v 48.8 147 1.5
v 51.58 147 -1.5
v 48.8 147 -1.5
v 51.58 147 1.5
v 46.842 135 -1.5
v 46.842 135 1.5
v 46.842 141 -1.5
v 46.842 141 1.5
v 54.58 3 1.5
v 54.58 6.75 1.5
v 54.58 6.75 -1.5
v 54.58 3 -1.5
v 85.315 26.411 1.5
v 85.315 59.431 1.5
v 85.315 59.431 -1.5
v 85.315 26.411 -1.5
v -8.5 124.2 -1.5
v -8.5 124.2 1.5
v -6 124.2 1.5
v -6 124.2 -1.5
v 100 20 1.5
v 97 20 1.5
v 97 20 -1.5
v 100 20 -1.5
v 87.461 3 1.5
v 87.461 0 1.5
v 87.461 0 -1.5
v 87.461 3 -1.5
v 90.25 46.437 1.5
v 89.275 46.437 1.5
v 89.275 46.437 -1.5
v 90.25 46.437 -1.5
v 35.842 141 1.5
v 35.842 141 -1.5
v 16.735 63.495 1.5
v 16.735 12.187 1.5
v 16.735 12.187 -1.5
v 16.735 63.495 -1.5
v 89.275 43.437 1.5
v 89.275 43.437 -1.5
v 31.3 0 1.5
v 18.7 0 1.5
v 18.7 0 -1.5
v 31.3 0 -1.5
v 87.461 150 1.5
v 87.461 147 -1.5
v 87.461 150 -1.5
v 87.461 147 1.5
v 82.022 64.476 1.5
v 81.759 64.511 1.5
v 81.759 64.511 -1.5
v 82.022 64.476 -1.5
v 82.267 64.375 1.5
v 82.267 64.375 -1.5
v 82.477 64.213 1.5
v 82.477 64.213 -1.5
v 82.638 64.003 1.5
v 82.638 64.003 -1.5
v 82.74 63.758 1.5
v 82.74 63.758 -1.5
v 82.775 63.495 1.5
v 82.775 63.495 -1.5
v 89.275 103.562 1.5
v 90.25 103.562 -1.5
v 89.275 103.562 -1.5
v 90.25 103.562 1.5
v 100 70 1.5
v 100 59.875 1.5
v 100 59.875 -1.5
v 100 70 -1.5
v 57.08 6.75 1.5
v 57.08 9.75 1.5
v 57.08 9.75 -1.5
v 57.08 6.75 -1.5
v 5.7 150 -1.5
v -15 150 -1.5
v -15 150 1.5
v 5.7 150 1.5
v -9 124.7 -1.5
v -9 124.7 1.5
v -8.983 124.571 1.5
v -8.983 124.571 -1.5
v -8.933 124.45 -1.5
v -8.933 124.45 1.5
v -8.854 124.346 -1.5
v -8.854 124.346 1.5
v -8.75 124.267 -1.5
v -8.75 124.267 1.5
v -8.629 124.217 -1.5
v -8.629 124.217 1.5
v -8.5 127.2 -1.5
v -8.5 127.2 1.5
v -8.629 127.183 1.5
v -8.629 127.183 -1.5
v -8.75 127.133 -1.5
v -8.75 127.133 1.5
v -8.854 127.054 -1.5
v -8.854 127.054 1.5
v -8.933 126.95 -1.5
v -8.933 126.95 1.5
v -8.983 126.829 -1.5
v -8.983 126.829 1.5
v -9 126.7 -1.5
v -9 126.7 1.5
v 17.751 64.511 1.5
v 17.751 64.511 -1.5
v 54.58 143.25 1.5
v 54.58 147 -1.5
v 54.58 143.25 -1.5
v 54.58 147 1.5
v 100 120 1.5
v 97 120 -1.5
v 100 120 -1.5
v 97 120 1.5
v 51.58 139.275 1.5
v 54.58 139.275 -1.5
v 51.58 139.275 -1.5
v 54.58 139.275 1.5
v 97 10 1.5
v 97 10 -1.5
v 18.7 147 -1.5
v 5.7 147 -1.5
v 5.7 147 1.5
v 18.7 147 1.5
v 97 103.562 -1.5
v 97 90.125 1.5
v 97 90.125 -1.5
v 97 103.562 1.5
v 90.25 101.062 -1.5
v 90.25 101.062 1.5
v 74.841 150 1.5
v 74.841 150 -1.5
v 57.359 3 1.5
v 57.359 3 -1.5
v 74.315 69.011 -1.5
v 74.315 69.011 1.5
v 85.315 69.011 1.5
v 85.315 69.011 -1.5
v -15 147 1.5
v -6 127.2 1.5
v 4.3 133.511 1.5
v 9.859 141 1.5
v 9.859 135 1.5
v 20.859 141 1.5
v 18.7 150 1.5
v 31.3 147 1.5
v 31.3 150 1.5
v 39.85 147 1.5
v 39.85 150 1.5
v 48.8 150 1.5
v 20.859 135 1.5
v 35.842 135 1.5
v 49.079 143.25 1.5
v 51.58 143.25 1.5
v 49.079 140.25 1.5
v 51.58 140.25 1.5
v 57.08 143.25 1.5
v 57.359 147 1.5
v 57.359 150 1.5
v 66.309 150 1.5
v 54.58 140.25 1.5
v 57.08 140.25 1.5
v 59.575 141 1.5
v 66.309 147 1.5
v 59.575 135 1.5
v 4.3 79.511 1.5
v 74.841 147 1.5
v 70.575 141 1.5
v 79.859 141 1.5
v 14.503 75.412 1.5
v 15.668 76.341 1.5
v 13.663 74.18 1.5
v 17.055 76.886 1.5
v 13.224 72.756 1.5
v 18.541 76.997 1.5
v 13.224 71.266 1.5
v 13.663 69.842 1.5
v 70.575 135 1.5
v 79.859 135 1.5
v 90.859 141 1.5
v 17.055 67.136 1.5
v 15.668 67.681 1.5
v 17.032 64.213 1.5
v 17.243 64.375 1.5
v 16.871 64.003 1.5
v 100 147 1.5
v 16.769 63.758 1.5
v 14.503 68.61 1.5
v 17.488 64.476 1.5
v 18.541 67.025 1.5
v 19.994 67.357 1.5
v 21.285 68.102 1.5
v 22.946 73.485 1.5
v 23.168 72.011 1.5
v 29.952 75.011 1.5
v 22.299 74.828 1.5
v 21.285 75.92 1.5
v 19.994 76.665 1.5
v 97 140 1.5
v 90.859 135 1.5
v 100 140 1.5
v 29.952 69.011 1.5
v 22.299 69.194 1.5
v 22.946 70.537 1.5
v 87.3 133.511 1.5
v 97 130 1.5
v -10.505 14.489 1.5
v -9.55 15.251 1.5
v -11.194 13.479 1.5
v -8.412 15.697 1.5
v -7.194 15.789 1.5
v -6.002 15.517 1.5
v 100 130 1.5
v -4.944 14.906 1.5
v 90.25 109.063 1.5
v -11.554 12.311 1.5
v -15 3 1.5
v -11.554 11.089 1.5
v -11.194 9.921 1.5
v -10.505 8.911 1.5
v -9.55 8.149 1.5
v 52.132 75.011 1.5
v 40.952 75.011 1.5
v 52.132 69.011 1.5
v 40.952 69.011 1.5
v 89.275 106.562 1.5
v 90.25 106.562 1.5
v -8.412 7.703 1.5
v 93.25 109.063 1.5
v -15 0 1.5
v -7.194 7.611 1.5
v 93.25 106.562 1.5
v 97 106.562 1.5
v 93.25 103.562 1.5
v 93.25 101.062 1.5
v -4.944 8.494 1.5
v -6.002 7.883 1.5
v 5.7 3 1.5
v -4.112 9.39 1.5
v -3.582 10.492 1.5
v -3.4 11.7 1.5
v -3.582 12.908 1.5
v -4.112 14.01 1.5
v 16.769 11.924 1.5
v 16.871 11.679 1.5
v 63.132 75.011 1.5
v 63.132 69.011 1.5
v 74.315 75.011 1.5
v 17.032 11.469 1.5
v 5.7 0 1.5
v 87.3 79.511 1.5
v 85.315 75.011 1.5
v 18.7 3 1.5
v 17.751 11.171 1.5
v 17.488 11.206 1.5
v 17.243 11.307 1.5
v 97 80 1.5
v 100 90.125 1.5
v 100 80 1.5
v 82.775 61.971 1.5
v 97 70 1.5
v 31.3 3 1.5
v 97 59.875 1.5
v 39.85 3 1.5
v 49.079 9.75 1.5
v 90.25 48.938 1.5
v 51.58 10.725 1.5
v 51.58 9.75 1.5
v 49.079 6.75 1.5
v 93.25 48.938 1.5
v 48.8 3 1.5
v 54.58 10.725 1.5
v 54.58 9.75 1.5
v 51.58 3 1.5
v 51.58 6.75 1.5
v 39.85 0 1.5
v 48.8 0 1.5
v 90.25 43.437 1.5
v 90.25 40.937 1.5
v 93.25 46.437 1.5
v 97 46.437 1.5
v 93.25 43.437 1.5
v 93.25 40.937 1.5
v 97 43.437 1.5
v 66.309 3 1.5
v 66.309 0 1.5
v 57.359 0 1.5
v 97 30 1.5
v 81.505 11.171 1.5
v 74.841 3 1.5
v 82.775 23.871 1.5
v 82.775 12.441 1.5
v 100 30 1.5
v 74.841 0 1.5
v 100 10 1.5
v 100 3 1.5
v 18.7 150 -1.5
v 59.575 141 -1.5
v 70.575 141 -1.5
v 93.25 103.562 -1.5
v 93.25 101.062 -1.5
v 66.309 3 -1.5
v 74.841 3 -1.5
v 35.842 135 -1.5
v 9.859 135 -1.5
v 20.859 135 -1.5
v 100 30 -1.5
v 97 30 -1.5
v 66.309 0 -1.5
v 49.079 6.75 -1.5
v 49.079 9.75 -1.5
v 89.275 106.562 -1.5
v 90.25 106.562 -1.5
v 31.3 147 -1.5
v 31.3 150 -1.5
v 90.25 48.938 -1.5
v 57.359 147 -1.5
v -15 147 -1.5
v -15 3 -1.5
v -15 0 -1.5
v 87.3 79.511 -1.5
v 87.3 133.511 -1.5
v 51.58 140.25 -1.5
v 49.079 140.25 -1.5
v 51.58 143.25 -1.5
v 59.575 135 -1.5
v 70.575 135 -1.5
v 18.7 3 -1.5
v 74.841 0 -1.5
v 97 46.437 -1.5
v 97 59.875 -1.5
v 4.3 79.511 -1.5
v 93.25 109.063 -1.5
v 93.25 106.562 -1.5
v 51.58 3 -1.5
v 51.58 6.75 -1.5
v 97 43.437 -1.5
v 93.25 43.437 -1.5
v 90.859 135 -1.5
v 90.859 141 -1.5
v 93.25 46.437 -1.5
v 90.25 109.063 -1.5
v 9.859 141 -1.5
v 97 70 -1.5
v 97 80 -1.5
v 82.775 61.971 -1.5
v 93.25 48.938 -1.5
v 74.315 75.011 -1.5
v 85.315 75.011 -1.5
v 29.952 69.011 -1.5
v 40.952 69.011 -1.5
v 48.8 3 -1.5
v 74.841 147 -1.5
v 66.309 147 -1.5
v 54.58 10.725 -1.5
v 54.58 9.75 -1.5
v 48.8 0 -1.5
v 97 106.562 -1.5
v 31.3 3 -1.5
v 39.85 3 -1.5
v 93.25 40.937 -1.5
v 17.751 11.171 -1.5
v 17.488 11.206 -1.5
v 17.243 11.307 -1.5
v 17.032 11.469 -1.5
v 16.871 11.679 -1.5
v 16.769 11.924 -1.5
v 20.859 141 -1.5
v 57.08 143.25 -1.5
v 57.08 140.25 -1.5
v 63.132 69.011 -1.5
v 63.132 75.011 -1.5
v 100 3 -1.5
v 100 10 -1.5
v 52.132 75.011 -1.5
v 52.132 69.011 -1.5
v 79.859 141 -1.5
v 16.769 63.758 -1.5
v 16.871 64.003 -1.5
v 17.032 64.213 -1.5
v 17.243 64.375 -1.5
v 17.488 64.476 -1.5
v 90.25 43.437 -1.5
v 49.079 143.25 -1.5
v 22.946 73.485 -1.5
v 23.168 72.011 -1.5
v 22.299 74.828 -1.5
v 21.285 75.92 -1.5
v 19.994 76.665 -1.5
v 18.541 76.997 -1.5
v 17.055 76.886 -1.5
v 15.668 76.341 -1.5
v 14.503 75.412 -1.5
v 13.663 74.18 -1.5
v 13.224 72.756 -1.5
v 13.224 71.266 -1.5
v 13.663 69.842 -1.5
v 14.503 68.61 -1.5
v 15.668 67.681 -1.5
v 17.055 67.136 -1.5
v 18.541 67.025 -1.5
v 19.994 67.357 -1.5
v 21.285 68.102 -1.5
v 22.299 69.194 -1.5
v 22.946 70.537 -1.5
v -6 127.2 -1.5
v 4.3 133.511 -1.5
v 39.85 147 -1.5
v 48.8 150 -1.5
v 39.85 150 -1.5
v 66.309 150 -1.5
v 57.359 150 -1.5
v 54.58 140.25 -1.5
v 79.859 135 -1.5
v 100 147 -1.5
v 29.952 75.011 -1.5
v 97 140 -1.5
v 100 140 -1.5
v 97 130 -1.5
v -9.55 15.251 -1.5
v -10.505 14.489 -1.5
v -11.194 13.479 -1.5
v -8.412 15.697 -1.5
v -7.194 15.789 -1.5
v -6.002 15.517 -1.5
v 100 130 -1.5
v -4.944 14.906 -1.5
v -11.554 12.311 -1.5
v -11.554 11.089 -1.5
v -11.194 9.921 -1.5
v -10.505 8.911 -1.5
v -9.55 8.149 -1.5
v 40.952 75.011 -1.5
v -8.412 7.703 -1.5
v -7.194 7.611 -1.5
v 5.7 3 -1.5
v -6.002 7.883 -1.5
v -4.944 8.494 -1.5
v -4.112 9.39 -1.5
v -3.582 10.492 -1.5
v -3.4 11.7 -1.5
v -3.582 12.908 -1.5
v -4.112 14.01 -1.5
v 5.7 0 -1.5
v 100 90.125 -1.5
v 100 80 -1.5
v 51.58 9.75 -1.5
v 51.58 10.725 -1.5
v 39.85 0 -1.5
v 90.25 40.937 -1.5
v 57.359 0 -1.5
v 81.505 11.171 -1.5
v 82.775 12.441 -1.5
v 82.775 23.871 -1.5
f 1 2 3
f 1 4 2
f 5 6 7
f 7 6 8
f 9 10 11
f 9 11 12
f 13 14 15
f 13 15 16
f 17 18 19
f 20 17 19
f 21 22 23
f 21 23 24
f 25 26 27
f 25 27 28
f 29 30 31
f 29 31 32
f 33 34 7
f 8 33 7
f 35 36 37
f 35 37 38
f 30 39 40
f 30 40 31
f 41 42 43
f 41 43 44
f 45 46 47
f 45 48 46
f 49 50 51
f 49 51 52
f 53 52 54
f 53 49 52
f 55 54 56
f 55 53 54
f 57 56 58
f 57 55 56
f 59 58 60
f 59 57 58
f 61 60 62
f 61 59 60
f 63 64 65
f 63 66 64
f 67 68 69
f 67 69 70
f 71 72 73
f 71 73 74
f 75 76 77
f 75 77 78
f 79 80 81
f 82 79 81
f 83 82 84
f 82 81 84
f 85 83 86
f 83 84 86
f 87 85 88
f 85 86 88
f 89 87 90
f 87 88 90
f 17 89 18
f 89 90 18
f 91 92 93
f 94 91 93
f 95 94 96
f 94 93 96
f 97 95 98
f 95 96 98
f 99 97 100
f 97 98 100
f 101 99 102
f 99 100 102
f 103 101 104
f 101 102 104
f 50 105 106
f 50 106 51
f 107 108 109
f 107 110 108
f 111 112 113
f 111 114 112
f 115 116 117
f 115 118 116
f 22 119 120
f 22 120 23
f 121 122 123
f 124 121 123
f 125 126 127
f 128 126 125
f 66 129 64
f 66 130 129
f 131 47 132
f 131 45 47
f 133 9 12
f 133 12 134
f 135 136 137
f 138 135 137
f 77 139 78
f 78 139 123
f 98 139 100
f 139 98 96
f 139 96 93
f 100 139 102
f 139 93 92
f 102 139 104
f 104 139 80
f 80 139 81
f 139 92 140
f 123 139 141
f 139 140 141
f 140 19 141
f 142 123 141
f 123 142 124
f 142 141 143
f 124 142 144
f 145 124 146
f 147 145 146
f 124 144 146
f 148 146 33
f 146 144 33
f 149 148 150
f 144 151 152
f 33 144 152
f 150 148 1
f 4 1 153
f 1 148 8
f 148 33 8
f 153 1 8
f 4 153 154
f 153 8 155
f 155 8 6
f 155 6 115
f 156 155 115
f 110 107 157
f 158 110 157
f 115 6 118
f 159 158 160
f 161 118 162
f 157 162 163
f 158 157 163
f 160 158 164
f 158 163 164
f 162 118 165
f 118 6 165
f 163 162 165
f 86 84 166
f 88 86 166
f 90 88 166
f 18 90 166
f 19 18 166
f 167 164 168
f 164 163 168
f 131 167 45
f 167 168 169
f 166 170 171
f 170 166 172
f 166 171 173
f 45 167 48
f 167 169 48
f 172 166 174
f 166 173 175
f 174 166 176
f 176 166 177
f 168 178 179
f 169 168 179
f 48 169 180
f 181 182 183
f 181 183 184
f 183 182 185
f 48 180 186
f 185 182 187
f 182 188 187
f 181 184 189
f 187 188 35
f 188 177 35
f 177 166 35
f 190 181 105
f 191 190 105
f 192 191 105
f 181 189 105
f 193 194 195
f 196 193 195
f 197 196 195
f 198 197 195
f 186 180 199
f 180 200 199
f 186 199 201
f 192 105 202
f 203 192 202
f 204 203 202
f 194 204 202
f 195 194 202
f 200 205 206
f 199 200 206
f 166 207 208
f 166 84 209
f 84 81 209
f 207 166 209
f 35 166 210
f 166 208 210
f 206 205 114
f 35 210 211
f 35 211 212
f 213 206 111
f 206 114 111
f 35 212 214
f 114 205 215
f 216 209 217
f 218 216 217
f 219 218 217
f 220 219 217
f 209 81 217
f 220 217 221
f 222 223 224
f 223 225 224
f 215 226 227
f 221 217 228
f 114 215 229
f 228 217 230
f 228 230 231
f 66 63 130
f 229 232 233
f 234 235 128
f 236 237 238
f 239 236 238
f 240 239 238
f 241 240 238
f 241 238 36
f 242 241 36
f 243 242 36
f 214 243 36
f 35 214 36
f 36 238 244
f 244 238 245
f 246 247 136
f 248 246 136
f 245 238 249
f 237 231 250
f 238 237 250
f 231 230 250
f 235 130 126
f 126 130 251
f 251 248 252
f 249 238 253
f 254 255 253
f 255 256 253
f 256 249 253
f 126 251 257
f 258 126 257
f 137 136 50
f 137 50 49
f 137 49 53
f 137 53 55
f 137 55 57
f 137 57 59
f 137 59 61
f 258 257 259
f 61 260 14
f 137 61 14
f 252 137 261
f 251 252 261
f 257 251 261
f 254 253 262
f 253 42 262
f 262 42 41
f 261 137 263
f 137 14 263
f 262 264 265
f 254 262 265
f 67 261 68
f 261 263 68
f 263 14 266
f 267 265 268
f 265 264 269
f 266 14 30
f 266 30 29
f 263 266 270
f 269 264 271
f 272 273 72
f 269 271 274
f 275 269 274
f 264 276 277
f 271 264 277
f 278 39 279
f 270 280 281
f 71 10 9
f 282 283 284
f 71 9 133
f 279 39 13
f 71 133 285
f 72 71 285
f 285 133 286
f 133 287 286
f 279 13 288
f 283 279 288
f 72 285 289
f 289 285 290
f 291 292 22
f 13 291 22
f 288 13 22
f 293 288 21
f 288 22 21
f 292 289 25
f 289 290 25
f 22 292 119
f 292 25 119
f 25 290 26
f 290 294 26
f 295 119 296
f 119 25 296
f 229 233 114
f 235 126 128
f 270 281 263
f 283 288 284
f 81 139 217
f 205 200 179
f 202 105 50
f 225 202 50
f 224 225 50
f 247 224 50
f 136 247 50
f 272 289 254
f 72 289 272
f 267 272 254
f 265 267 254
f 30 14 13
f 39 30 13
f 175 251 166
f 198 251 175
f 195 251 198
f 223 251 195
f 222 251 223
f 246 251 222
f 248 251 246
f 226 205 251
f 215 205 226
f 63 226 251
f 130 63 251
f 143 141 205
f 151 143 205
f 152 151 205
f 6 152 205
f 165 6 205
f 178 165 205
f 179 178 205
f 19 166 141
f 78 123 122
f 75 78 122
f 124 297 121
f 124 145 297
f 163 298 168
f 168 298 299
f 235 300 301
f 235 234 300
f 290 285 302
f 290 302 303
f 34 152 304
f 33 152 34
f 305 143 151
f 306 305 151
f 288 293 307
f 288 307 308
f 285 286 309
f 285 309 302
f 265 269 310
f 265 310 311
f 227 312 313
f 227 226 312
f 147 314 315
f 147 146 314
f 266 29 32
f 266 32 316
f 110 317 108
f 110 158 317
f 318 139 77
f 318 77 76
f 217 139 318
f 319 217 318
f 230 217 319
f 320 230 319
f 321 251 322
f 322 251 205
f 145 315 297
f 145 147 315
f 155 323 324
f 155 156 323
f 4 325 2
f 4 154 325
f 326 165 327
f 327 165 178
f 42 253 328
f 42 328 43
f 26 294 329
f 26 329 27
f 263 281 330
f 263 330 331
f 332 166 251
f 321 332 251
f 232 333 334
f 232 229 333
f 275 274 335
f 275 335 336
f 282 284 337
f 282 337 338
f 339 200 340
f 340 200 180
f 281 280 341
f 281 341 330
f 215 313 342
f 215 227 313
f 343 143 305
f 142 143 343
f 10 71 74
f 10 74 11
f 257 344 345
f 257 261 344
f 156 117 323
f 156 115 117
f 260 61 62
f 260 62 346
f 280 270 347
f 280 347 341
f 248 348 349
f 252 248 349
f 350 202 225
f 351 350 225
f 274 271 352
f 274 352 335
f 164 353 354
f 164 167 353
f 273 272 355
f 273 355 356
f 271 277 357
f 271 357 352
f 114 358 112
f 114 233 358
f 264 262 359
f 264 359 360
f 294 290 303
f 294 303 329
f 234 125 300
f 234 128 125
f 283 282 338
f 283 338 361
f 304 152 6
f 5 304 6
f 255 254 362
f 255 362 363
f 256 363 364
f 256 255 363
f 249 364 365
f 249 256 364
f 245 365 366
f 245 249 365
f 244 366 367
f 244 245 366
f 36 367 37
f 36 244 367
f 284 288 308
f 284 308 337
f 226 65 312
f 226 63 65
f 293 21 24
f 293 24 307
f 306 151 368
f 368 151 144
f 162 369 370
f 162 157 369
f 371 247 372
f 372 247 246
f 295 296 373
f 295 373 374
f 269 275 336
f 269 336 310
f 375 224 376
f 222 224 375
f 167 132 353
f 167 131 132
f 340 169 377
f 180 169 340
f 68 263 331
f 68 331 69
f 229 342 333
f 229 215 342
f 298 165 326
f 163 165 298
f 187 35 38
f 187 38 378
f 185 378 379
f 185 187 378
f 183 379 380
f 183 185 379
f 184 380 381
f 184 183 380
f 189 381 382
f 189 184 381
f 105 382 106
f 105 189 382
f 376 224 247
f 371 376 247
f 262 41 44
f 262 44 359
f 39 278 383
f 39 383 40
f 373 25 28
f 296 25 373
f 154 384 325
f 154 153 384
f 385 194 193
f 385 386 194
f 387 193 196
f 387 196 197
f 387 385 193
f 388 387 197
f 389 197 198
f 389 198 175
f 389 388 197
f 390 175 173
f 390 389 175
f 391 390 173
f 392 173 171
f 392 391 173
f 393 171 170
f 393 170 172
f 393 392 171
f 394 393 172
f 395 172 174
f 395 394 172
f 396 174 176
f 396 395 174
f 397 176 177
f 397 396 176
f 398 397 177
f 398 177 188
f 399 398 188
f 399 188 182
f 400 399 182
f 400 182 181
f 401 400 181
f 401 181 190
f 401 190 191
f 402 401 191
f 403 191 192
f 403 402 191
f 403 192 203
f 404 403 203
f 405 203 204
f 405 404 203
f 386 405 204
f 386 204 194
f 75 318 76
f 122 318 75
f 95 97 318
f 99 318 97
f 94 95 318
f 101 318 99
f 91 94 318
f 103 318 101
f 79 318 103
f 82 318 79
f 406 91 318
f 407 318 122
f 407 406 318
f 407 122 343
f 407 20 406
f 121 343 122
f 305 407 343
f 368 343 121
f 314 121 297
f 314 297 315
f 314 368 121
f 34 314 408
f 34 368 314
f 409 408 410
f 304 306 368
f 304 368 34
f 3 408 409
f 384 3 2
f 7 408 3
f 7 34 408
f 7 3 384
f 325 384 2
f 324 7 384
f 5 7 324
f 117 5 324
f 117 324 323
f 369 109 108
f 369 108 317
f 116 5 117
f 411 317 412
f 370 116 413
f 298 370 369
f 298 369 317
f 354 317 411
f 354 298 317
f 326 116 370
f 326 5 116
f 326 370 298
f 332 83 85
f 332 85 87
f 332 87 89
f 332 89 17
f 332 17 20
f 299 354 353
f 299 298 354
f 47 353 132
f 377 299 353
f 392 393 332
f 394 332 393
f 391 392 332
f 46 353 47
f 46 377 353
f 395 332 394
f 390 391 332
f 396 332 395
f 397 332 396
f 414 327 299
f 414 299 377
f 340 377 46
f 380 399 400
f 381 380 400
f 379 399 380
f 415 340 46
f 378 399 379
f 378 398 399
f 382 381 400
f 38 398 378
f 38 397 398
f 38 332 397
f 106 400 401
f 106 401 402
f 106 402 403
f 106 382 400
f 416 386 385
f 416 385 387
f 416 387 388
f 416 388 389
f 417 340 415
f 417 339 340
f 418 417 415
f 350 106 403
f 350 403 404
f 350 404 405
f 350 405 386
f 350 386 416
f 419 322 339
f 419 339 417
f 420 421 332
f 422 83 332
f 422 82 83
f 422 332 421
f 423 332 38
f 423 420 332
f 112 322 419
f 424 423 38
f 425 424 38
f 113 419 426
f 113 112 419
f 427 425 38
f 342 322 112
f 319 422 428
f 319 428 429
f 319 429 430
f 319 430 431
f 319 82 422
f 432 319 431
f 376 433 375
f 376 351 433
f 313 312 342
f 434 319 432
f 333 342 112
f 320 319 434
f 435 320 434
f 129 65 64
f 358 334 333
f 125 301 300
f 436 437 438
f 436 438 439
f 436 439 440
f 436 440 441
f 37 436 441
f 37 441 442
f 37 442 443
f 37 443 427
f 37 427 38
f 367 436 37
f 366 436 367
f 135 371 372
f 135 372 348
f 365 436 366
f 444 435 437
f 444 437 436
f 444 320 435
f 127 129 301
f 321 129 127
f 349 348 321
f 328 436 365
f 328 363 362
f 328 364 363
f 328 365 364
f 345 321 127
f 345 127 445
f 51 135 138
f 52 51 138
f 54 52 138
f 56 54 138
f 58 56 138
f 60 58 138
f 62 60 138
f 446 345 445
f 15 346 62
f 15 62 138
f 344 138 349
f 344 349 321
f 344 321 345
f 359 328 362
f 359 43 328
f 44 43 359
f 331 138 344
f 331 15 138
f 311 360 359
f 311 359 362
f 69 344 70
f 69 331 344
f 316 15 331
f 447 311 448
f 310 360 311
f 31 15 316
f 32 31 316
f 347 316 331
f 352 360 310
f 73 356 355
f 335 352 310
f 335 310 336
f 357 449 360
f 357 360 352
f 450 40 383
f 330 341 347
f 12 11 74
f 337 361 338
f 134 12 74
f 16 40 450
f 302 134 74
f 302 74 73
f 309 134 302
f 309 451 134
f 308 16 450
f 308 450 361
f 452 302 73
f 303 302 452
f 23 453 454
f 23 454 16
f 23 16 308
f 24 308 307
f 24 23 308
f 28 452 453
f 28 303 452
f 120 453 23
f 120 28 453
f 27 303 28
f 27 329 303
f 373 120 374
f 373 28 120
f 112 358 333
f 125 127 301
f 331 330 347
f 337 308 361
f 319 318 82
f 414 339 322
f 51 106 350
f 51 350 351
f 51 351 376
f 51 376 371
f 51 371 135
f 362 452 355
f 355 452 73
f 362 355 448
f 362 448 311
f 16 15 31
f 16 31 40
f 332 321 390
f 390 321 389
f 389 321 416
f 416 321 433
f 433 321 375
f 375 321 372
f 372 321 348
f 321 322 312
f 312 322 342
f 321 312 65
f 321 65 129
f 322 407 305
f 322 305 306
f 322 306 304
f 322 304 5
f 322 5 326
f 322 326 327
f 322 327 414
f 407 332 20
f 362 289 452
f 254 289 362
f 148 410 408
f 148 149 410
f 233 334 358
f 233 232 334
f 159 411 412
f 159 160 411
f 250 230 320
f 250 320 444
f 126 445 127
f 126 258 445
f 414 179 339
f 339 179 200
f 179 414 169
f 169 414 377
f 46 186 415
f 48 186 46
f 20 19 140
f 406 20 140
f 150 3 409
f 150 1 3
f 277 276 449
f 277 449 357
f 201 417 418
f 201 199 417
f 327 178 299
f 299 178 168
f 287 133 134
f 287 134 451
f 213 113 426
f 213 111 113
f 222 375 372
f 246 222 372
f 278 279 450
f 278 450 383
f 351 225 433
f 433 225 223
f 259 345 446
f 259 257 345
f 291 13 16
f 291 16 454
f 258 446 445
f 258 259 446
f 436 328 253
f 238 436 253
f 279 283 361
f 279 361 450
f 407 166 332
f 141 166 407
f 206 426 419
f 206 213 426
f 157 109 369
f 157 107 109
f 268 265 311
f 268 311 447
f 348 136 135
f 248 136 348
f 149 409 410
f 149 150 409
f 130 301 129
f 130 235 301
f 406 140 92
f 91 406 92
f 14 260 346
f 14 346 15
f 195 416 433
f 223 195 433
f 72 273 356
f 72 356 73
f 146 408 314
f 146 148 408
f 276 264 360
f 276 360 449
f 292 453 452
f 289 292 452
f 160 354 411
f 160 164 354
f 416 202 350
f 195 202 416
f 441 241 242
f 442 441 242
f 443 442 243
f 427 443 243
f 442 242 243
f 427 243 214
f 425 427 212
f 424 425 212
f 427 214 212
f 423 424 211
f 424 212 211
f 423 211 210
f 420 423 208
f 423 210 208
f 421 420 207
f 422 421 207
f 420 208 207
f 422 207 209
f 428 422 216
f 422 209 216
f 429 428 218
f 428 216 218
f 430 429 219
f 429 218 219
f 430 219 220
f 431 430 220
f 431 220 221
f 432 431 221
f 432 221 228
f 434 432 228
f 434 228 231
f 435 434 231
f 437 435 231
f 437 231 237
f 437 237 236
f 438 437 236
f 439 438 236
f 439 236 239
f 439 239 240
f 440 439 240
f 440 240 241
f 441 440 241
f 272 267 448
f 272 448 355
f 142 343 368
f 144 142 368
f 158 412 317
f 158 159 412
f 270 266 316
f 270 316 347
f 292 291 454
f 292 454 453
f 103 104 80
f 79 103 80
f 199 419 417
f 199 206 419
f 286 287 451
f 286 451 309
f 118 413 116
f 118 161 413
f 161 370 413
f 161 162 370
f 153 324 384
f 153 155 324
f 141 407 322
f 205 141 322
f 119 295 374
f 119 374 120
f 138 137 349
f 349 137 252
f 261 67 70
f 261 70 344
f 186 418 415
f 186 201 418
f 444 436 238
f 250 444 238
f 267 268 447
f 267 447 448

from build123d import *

# Parameters (mm, degrees)
CROQUIS1_R              = 5.000000001
CROQUIS1_W              = 11.000000002
CROQUIS1_H              = 6.000000001
CROQUIS1_W_2            = 11.000000001
CROQUIS1_W_3            = 83.00000001
CROQUIS1_H_2            = 54.000000007
SALIENTE_EXTRUIR1_DEPTH = 1.5
CROQUIS3_W              = 3
CROQUIS3_H              = 143.999988457
SALIENTE_EXTRUIR2_DEPTH = 15
CROQUIS4_R              = 4.1
CORTAR_EXTRUIR1_DEPTH   = 23
CROQUIS8_W              = 20.699997559
CROQUIS8_H              = 3
SALIENTE_EXTRUIR4_DEPTH = 3
CROQUIS9_W              = 20.699997559
CROQUIS9_H              = 3
SALIENTE_EXTRUIR5_DEPTH = 3


with BuildPart() as part:
    # Croquis1 → Saliente-Extruir1 (new, symmetric)
    with BuildSketch(Plane.XY):
        Polygon((18.699888738, 146.999988499), (-0.000108821, 146.999988499), (-0.000108821, 3.000000042), (18.699888738, 3.000000042), (18.699888738, -1.1561e-05), (31.299897882, -1.1561e-05), (31.299897882, 2.999988439), (39.849897883, 2.999988439), (39.849897883, 6.5452e-05), (48.799897884, 6.5452e-05), (48.799897884, 3.000065452), (51.579549154, 3.000065452), (51.579549154, 6.749716476), (49.079130382, 6.749716476), (49.079130382, 9.750065453), (51.579549154, 9.750065453), (51.579549154, 10.725065453), (54.579549155, 10.725065453), (54.579549155, 9.750065453), (57.079549155, 9.750065453), (57.079549155, 6.749716476), (54.579549155, 6.749716476), (54.579549155, 3.000065452), (57.359200426, 3.000065452), (57.359200426, 9.8389e-05), (66.309200426, 9.8389e-05), (66.309200426, 3.00009839), (74.840541181, 3.00009839), (74.840541181, 9.8305e-05), (87.461202556, 0.000103657), (87.461202556, 3.000103699), (99.999885723, 3.000103699), (99.999885723, 9.999884868), (96.999885722, 9.999884868), (96.999885722, 19.999884869), (99.999885723, 19.999884869), (99.999885723, 29.99988487), (96.999885722, 29.99988487), (96.999885722, 43.437175485), (93.250234699, 43.437175485), (93.250234699, 40.937175485), (90.249885721, 40.937175485), (90.249885721, 43.437175485), (89.274885721, 43.437175485), (89.274885721, 46.437175486), (90.249885721, 46.437175486), (90.249885721, 48.937594258), (93.250234699, 48.937594258), (93.250234699, 46.437175486), (96.999885722, 46.437175486), (96.999885722, 59.874884873), (99.999885723, 59.874884873), (99.999885723, 69.999884875), (96.999885722, 69.999884875), (96.999885722, 79.999884876), (99.999885723, 79.999884876), (99.999885723, 90.124884877), (96.999885722, 90.124884877), (96.999885722, 103.562175492), (93.250234699, 103.562175492), (93.250234699, 101.062175492), (90.249885721, 101.062175492), (90.249885721, 103.562175492), (89.274885721, 103.562175492), (89.274885721, 106.562175493), (90.249885721, 106.562175493), (90.249885721, 109.062594265), (93.250234699, 109.062594265), (93.250234699, 106.562175493), (96.999885722, 106.562175493), (96.999885722, 119.99988488), (99.999885723, 119.99988488), (99.999885723, 129.999884881), (96.999885722, 129.999884881), (96.999885722, 139.999884883), (99.999885723, 139.999884883), (99.999885723, 146.999884842), (87.461202556, 146.999884842), (87.461202556, 149.999884884), (74.840541181, 149.999890236), (74.840541181, 146.999890151), (66.309200426, 146.999890151), (66.309200426, 149.999890151), (57.359200426, 149.999890151), (57.359200426, 146.999923088), (54.579549155, 146.999923088), (54.579549155, 143.250272065), (57.079549155, 143.250272065), (57.079549155, 140.249923087), (54.579549155, 140.249923087), (54.579549155, 139.274923087), (51.579549154, 139.274923087), (51.579549154, 140.249923087), (49.079130382, 140.249923087), (49.079130382, 143.250272065), (51.579549154, 143.250272065), (51.579549154, 146.999923088), (48.799897884, 146.999923088), (48.799897884, 149.999923089), (39.849897883, 149.999923089), (39.849897883, 147.000000101), (31.299897882, 147.000000101), (31.299897882, 150.000000101), (18.699888738, 150.000000101), align=None)
        with Locations((18.167765659, 72.011021453)):
            Circle(CROQUIS1_R, mode=Mode.SUBTRACT)
        with Locations((35.451849713, 72.011021453)):
            Rectangle(CROQUIS1_W, CROQUIS1_H, mode=Mode.SUBTRACT)
        with BuildLine():
            Line((82.774554778, 63.495021452), (82.774554778, 61.971021451))
            Line((82.774554778, 61.971021451), (85.314554779, 59.431021451))
            Line((85.314554779, 59.431021451), (85.314554779, 26.411021447))
            Line((85.314554779, 26.411021447), (82.774554778, 23.871021447))
            Line((82.774554778, 23.871021447), (82.774554778, 12.441021446))
            Line((82.774554778, 12.441021446), (81.504554778, 11.171021446))
            Line((81.504554778, 11.171021446), (17.750554771, 11.171021446))
            ThreePointArc((17.750554771, 11.171021446), (17.032134281, 11.468600956), (16.734554771, 12.187021446))
            Line((16.734554771, 12.187021446), (16.734554771, 63.495021452))
            ThreePointArc((16.734554771, 63.495021452), (17.032134281, 64.213441941), (17.750554771, 64.511021452))
            Line((17.750554771, 64.511021452), (81.758554778, 64.511021452))
            ThreePointArc((81.758554778, 64.511021452), (82.476975268, 64.213441941), (82.774554778, 63.495021452))
        make_face(mode=Mode.SUBTRACT)
        with Locations((57.631849716, 72.011021453)):
            Rectangle(CROQUIS1_W_2, CROQUIS1_H, mode=Mode.SUBTRACT)
        with Locations((79.814554778, 72.011021453)):
            Rectangle(CROQUIS1_W, CROQUIS1_H, mode=Mode.SUBTRACT)
        with Locations((45.799885716, 106.511021457)):
            Rectangle(CROQUIS1_W_3, CROQUIS1_H_2, mode=Mode.SUBTRACT)
        with Locations((15.358852485, 137.999884882)):
            Rectangle(CROQUIS1_W_2, CROQUIS1_H, mode=Mode.SUBTRACT)
        with Locations((41.342185821, 137.999884882)):
            Rectangle(CROQUIS1_W_2, CROQUIS1_H, mode=Mode.SUBTRACT)
        with Locations((65.074870839, 137.999884882)):
            Rectangle(CROQUIS1_W_2, CROQUIS1_H, mode=Mode.SUBTRACT)
        with Locations((85.358852493, 137.999884882)):
            Rectangle(CROQUIS1_W_2, CROQUIS1_H, mode=Mode.SUBTRACT)
    extrude(amount=SALIENTE_EXTRUIR1_DEPTH, both=True)

    # Croquis3 → Saliente-Extruir2 (add)
    with BuildSketch(Plane.ZY.offset(0.000108821)):
        with Locations((0, 74.999994271)):
            Rectangle(CROQUIS3_W, CROQUIS3_H)
    extrude(amount=SALIENTE_EXTRUIR2_DEPTH)

    # Croquis4 → Cortar-Extruir1 (cut)
    with BuildSketch(Plane.XY.offset(1.5)):
        with Locations((-7.499965561, 11.700000042)):
            Circle(CROQUIS4_R)
        with BuildLine():
            Line((-5.999990973, 127.200018373), (-8.499990973, 127.200018373))
            ThreePointArc((-8.499990973, 127.200018373), (-8.853544364, 127.053571764), (-8.999990973, 126.700018373))
            Line((-8.999990973, 126.700018373), (-8.999990973, 124.700000042))
            ThreePointArc((-8.999990973, 124.700000042), (-8.853544364, 124.346446651), (-8.499990973, 124.200000042))
            Line((-8.499990973, 124.200000042), (-5.999990973, 124.200000042))
            Line((-5.999990973, 124.200000042), (-5.999990973, 127.200018373))
        make_face()
    extrude(amount=-CORTAR_EXTRUIR1_DEPTH, mode=Mode.SUBTRACT)

    # Croquis8 → Saliente-Extruir4 (add)
    with BuildSketch(Plane.XZ.offset(-3.000000042)):
        with Locations((-4.650110042, 0)):
            Rectangle(CROQUIS8_W, CROQUIS8_H)
    extrude(amount=SALIENTE_EXTRUIR4_DEPTH)

    # Croquis9 → Saliente-Extruir5 (add)
    with BuildSketch(Plane(origin=(0, 146.999988499, 0), x_dir=(1, 0, 0), z_dir=(0, 1, 0))):
        with Locations((-4.650110042, 0)):
            Rectangle(CROQUIS9_W, CROQUIS9_H)
    extrude(amount=SALIENTE_EXTRUIR5_DEPTH)


solid = part.part
